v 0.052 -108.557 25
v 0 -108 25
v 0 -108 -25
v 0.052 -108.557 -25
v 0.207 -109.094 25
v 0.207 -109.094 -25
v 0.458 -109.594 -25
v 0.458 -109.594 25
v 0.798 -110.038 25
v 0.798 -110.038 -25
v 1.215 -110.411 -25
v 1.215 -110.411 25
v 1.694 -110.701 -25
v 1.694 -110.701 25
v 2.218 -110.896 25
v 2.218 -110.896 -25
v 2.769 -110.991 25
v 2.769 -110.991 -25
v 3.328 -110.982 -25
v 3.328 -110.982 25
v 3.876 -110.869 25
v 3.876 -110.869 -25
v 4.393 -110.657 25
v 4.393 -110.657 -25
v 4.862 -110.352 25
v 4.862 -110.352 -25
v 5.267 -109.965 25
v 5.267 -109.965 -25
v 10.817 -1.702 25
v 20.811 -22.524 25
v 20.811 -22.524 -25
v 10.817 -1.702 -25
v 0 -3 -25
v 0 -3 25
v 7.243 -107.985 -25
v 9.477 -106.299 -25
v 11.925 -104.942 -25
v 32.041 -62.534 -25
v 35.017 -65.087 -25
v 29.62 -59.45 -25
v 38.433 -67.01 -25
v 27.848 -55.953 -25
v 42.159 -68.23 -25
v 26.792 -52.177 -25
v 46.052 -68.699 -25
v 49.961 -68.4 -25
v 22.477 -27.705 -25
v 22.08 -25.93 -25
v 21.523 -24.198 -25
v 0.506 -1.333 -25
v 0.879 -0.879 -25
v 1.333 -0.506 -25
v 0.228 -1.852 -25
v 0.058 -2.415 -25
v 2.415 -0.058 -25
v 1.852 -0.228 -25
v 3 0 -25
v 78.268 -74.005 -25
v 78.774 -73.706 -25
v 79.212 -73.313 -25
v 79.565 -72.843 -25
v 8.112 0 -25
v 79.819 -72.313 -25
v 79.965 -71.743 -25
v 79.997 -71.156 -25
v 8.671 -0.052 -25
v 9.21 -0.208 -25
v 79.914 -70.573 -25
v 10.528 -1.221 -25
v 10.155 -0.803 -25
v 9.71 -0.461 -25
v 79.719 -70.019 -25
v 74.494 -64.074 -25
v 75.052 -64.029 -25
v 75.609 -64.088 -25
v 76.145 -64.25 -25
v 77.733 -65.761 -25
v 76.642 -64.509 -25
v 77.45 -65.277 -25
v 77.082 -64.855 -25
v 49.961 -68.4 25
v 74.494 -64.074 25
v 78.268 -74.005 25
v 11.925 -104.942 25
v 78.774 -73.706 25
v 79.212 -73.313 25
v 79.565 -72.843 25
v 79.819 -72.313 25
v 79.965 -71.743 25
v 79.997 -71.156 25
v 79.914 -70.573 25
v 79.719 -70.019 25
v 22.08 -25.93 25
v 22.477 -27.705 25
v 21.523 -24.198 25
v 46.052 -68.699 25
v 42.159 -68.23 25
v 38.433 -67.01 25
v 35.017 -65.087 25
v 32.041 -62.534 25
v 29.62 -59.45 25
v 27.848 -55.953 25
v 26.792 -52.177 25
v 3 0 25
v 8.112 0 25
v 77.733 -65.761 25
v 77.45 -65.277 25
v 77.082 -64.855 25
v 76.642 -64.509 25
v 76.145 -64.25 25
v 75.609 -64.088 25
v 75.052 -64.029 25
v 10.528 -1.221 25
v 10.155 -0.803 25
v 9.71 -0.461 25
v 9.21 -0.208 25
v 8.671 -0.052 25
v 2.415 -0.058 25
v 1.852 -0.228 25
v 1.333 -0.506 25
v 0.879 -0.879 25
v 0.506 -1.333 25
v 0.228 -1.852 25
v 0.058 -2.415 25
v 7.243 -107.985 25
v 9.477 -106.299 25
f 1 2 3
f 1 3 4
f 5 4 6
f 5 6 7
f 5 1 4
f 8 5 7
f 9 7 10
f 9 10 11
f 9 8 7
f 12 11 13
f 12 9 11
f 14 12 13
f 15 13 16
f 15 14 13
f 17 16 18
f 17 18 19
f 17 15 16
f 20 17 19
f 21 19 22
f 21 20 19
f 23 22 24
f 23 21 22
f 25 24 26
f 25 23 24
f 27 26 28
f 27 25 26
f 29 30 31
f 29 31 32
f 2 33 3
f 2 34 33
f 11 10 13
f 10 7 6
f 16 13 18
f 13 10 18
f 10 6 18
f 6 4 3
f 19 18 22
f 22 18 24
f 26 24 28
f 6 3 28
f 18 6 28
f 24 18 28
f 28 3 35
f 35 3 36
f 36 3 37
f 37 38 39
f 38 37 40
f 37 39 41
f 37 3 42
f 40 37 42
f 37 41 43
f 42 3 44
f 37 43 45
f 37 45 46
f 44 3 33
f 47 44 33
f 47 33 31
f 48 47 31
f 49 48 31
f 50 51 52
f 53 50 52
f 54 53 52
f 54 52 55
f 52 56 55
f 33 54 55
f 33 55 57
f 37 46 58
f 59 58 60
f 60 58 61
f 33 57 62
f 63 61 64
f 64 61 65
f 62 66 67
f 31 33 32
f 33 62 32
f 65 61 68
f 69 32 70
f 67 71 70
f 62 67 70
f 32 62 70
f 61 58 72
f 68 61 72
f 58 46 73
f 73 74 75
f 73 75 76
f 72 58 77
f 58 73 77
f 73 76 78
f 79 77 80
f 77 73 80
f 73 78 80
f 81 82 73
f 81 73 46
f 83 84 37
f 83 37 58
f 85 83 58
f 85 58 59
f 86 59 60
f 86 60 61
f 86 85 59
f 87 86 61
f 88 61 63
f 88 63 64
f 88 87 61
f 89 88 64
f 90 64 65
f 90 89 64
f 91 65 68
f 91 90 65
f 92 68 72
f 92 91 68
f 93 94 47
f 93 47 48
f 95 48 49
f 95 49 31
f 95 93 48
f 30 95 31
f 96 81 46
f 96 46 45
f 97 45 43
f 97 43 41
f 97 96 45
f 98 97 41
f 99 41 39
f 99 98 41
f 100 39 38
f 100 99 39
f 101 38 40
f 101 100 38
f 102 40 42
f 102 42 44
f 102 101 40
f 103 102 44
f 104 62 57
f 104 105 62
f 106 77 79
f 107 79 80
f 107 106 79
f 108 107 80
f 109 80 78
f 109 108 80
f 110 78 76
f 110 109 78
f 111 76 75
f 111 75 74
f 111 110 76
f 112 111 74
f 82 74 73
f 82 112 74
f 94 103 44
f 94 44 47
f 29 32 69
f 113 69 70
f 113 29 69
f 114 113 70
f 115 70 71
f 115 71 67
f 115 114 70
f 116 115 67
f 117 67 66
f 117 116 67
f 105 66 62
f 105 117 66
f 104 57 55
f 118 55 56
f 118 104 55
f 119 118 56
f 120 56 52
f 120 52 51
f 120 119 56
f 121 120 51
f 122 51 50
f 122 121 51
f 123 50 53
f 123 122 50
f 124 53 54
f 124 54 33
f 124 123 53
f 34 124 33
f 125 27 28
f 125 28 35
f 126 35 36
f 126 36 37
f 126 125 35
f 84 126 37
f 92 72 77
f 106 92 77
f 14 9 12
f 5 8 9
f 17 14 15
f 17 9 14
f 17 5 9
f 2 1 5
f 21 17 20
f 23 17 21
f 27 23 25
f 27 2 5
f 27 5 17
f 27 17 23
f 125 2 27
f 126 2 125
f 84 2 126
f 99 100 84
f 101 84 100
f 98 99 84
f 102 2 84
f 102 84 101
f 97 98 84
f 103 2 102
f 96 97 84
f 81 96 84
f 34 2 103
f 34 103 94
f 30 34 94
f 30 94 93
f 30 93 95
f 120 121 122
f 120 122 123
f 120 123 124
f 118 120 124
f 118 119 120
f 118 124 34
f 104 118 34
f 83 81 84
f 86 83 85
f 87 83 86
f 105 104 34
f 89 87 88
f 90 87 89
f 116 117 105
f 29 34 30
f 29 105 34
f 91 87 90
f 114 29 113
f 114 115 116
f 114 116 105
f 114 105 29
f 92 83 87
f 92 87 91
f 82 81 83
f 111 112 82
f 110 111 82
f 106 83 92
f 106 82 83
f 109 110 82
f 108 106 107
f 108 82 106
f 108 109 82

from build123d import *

# Parameters (mm, degrees)
EXTRUDE1_DEPTH = 25


with BuildPart() as part:
    # Sketch1 → Extrude1 (new body, symmetric)
    with BuildSketch(Plane.XY):
        with BuildLine():
            Line((0, -3), (0, -53.784988575))
            Line((0, -53.784988575), (0, -108))
            ThreePointArc((0, -108), (1.951109669, -110.810663458), (5.266552715, -109.96538515))
            ThreePointArc((5.266552715, -109.96538515), (8.33076313, -107.102662764), (11.924538917, -104.941797077))
            Line((11.924538917, -104.941797077), (78.267854785, -74.00540082))
            ThreePointArc((78.267854785, -74.00540082), (79.819077862, -72.312537889), (79.718923361, -70.018622673))
            Line((79.718923361, -70.018622673), (77.733454722, -65.760771437))
            ThreePointArc((77.733454722, -65.760771437), (76.399777201, -64.367593723), (74.493586828, -64.074202964))
            Line((74.493586828, -64.074202964), (49.961112633, -68.399940068))
            ThreePointArc((49.961112633, -68.399940068), (35.016620352, -65.086825893), (26.791994019, -52.176748561))
            Line((26.791994019, -52.176748561), (22.477002989, -27.705218377))
            ThreePointArc((22.477002989, -27.705218377), (21.821246743, -25.05746196), (20.811309078, -22.523560578))
            Line((20.811309078, -22.523560578), (10.816867263, -1.701806797))
            ThreePointArc((10.816867263, -1.701806797), (9.710018402, -0.460848606), (8.11229809, 0))
            Line((8.11229809, 0), (3, 0))
            ThreePointArc((3, 0), (0.878679656, -0.878679656), (0, -3))
        make_face()
    extrude(amount=EXTRUDE1_DEPTH, both=True)


solid = part.part
